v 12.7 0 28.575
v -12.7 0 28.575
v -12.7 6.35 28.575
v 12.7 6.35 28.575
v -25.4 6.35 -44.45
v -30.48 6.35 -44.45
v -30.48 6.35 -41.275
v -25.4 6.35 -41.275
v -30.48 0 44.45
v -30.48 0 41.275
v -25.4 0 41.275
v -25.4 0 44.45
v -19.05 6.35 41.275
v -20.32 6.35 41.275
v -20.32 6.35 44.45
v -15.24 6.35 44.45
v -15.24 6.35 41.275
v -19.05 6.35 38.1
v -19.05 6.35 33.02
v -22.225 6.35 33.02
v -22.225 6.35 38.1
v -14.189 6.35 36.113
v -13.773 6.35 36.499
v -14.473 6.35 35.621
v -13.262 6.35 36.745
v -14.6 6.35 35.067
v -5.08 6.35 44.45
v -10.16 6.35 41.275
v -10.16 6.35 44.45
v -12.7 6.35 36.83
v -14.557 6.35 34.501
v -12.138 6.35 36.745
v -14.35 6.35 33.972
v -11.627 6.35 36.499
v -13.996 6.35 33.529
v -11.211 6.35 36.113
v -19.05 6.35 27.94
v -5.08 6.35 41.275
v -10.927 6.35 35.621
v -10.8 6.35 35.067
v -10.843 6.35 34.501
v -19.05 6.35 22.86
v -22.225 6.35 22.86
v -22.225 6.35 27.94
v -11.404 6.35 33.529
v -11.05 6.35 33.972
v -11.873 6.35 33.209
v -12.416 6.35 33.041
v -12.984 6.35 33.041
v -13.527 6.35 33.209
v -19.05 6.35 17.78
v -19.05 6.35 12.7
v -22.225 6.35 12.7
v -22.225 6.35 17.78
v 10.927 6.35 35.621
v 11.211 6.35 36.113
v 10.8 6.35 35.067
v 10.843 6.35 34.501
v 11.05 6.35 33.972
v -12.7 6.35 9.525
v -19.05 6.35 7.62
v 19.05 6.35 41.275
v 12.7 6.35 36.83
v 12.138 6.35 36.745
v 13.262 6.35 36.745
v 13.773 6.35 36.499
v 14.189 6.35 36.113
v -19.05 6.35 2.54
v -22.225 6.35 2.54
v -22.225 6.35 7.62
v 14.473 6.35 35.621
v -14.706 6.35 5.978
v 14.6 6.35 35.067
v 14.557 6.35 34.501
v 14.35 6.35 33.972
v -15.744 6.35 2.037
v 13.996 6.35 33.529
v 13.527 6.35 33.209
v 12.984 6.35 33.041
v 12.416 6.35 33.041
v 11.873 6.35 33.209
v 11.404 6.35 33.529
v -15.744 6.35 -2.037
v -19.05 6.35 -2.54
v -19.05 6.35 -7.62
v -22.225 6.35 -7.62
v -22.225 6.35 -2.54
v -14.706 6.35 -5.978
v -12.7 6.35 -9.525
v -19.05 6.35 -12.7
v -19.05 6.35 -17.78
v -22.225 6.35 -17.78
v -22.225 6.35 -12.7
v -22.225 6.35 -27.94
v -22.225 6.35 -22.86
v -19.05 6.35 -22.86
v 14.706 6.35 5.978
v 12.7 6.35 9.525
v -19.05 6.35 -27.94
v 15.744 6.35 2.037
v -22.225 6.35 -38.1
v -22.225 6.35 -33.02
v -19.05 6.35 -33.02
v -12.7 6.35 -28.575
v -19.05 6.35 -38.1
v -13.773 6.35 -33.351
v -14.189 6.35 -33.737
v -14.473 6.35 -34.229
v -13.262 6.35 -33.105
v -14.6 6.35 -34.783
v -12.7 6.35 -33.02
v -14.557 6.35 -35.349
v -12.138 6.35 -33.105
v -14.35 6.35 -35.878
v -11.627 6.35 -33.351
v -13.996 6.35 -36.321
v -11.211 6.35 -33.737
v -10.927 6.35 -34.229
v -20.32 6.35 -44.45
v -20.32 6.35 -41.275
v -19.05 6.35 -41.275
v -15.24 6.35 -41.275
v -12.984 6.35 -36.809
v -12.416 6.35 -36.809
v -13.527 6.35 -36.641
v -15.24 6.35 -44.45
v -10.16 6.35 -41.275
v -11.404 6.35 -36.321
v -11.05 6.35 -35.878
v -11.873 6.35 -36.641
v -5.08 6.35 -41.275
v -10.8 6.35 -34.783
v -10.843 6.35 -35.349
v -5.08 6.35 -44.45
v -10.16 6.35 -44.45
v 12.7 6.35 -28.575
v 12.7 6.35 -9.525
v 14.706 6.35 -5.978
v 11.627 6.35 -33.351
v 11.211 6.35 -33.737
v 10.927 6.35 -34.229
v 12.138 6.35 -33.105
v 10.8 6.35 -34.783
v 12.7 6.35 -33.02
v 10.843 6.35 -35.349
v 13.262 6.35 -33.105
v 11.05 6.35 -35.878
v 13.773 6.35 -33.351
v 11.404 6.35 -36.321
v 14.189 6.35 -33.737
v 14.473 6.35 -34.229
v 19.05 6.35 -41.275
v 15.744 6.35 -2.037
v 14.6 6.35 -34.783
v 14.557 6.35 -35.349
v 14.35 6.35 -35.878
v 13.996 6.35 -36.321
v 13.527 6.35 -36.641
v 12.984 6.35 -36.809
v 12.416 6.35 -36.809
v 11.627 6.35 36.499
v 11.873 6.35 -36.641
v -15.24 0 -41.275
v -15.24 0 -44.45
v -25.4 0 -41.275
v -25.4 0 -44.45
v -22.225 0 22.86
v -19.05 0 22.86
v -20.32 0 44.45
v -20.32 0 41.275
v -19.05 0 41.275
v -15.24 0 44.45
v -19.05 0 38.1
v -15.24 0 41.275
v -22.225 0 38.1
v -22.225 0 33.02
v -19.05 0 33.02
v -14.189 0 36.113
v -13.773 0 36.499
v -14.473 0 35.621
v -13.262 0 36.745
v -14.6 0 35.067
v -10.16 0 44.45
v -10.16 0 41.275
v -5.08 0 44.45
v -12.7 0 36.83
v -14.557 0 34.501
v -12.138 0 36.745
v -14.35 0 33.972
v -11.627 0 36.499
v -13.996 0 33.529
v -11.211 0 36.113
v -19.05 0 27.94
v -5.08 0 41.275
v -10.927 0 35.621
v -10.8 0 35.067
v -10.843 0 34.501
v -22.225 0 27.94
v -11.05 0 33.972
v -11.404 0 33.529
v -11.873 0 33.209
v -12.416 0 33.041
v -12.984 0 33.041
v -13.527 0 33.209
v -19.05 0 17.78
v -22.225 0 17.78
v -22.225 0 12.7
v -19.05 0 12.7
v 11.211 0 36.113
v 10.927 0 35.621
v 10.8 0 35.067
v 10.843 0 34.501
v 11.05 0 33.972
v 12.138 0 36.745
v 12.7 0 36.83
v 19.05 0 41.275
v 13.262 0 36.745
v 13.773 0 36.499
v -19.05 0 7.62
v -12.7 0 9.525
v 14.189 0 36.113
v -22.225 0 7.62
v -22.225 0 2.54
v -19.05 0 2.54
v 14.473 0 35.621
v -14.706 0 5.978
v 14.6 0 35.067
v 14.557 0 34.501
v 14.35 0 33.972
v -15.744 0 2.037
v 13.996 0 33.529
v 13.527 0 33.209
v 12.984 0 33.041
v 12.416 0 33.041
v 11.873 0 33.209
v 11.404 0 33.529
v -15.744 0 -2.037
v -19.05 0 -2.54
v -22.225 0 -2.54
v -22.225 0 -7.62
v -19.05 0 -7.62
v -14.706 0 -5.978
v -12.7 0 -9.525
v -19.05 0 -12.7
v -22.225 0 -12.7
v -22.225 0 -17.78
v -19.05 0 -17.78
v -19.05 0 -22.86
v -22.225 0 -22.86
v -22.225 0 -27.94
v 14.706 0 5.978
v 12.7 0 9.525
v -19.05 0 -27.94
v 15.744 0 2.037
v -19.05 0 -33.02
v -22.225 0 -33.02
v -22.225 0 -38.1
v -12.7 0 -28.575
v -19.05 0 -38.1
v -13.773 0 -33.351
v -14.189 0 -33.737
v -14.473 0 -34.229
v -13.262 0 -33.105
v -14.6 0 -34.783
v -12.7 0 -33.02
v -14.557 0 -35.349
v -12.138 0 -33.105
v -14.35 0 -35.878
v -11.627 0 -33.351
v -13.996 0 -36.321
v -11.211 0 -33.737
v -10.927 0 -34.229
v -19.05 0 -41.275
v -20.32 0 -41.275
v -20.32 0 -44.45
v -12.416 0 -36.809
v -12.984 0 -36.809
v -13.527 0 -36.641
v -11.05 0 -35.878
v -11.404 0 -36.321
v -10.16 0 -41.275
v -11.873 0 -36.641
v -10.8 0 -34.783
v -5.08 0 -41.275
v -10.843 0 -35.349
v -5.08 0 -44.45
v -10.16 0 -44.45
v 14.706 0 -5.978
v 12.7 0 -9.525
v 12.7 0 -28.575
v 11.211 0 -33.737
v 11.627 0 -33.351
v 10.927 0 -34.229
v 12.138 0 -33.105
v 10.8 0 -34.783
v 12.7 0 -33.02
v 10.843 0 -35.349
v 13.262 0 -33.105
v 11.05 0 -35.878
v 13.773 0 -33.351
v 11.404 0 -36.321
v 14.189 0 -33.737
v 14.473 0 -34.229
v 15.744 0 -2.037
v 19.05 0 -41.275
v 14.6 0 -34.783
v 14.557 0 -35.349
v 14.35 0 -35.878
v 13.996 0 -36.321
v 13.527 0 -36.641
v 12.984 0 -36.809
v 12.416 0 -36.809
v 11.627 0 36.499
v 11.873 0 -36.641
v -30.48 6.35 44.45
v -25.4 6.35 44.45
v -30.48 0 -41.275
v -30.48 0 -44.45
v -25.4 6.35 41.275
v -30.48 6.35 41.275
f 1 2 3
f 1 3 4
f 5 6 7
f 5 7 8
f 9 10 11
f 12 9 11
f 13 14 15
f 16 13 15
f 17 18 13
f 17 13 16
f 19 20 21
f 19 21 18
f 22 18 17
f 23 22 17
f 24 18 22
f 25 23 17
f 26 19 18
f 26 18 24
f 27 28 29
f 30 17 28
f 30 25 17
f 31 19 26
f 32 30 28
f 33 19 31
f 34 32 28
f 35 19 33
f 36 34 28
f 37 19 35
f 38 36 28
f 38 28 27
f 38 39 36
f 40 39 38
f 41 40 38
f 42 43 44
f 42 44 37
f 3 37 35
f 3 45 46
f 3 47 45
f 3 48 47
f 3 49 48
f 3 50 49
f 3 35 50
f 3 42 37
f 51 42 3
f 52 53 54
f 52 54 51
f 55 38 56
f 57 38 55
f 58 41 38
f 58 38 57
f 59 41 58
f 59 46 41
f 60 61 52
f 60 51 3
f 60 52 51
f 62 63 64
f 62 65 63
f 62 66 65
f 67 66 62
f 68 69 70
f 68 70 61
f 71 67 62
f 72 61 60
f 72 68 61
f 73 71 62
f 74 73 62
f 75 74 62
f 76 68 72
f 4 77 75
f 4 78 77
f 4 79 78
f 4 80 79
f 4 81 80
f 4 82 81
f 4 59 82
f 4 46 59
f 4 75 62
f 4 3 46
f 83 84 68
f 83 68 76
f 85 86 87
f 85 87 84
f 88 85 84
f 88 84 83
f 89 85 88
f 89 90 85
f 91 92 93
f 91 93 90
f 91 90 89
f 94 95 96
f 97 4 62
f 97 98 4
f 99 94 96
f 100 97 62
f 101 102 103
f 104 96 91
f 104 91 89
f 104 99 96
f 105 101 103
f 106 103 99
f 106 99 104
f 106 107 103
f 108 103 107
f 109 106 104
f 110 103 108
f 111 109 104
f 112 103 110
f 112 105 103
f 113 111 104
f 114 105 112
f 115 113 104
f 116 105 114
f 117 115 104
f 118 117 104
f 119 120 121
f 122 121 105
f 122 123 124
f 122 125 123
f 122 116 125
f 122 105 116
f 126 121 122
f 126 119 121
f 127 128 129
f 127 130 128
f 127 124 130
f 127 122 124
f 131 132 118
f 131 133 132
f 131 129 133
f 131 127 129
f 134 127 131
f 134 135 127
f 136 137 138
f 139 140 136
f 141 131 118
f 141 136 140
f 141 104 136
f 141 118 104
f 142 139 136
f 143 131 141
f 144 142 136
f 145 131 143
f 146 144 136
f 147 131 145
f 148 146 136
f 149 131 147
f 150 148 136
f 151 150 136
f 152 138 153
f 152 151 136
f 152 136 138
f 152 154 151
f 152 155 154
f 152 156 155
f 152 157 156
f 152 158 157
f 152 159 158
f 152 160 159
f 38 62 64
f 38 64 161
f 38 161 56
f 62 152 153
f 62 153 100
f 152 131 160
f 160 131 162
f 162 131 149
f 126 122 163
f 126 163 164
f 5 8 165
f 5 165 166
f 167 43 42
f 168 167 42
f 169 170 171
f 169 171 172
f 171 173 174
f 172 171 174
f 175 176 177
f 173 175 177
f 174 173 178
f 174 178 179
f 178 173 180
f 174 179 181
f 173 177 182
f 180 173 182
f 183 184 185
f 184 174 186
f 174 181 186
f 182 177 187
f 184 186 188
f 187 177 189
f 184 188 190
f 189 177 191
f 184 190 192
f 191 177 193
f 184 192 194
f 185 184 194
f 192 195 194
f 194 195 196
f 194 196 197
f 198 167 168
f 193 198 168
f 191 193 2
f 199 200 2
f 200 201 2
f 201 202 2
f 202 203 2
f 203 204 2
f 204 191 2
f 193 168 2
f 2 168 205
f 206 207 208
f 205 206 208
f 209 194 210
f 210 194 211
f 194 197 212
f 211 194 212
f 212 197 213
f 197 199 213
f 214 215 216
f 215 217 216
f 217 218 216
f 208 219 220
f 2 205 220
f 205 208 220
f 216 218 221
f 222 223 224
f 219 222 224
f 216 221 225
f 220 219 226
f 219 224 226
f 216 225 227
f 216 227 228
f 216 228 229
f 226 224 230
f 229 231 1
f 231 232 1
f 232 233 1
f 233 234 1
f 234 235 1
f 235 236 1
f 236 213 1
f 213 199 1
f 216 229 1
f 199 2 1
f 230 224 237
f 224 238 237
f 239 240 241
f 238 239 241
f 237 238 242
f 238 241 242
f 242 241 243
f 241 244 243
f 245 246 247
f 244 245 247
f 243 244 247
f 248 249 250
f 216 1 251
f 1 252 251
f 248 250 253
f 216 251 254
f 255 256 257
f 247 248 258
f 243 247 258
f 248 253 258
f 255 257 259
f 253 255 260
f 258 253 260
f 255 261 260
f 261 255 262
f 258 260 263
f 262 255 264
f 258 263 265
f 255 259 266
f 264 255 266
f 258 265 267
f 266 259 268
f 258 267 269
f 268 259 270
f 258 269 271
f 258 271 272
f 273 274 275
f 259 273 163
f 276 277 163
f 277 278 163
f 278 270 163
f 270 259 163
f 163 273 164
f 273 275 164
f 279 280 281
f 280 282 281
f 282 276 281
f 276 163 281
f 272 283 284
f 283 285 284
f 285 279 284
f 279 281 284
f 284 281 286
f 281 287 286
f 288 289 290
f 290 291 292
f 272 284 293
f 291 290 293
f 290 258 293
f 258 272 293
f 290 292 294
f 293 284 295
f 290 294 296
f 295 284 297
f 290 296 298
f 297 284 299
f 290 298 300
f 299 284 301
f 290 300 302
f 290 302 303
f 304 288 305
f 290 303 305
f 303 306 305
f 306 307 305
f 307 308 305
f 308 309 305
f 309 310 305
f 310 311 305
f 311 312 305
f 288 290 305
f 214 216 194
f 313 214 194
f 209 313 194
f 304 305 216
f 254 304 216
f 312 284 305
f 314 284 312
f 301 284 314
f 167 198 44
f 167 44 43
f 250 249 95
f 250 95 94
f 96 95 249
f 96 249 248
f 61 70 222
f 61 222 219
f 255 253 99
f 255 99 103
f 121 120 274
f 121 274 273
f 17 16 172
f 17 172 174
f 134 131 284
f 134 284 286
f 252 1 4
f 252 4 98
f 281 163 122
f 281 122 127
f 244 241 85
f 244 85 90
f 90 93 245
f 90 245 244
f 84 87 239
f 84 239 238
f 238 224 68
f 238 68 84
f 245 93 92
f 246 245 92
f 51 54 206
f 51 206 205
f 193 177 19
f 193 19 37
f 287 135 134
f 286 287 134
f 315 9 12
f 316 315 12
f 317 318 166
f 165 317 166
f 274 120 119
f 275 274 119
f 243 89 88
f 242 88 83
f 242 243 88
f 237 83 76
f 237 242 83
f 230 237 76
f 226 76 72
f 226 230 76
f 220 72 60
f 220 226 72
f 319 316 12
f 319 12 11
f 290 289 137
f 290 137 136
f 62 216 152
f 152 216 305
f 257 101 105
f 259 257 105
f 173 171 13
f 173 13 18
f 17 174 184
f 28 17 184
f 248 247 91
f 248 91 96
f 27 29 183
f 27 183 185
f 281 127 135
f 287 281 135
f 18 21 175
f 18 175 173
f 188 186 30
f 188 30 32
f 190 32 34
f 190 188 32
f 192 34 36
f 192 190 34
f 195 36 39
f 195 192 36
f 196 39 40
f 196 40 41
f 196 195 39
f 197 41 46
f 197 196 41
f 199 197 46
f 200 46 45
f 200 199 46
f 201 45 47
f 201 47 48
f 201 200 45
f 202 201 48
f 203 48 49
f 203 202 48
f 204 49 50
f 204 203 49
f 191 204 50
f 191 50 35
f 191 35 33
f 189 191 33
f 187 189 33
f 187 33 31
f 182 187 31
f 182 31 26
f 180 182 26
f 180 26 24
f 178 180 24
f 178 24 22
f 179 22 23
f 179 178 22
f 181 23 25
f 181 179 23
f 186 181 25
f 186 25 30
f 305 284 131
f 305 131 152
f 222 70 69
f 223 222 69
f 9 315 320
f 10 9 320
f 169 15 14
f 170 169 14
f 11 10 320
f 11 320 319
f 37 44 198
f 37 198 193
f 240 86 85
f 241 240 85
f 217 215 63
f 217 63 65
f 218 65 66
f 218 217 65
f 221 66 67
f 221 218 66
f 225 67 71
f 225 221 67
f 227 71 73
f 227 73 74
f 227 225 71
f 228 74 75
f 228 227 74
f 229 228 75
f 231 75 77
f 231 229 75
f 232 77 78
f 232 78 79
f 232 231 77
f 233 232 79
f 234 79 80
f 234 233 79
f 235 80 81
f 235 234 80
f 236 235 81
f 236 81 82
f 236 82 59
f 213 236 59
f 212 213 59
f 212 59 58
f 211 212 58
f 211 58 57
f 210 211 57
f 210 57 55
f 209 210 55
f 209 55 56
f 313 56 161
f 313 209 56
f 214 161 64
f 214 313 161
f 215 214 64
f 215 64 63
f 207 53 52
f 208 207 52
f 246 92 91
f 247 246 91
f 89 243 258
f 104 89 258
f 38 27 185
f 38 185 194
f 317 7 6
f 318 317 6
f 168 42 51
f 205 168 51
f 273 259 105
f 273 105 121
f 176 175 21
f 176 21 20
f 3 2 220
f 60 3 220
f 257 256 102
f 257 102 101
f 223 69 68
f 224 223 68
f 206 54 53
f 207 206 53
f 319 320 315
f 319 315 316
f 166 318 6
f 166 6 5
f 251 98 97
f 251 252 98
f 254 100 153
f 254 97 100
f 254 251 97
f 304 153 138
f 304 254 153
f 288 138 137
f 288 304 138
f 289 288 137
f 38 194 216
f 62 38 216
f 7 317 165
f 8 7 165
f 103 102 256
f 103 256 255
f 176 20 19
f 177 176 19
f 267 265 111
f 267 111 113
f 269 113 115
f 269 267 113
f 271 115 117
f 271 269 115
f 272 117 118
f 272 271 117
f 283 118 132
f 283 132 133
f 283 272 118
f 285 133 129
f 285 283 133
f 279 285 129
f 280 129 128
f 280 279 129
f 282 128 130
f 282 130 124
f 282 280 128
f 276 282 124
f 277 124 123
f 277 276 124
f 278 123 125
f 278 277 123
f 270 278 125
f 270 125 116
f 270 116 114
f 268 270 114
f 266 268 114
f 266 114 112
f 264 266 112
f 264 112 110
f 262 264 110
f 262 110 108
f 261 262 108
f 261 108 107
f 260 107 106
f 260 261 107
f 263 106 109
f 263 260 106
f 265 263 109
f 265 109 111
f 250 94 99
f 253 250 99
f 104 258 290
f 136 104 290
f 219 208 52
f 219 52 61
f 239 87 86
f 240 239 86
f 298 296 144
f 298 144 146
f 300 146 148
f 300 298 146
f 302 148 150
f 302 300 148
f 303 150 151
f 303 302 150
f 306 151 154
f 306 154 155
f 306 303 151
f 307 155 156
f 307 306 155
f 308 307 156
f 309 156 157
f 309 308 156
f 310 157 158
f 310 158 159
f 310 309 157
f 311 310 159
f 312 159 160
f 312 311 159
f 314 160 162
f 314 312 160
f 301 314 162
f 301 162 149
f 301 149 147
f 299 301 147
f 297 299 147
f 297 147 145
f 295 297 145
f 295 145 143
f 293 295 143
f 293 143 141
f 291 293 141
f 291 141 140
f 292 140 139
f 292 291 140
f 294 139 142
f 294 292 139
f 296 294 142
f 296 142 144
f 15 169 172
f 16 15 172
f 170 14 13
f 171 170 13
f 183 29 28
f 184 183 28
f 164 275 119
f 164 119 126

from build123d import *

# Parameters (mm, degrees)
SKETCH1_W           = 38.1
SKETCH1_H           = 82.55
SKETCH1_R           = 1.905
SKETCH1_W_2         = 25.4
SKETCH1_H_2         = 57.15
BOSS_EXTRUDE1_DEPTH = 6.35
SKETCH2_R           = 15.875
CUT_EXTRUDE1_DEPTH  = 46.900442536
SKETCH3_W           = 3.175
SKETCH3_H           = 5.08
SKETCH3_W_2         = 5.08
SKETCH3_H_2         = 3.175
BOSS_EXTRUDE2_DEPTH = 6.35


with BuildPart() as part:
    # Sketch1 → Boss-Extrude1 (new body)
    with BuildSketch(Plane(origin=(0, 0, 0), x_dir=(1, 0, 0), z_dir=(0, 1, 0))):
        Rectangle(SKETCH1_W, SKETCH1_H)
        with Locations(Location((-12.7, 34.925, 0), (0, 0, 270))):
            Circle(SKETCH1_R, mode=Mode.SUBTRACT)
        with Locations(Location((12.7, 34.925, 0), (0, 0, 270))):
            Circle(SKETCH1_R, mode=Mode.SUBTRACT)
        with Locations(Location((12.7, -34.925, 0), (0, 0, 270))):
            Circle(SKETCH1_R, mode=Mode.SUBTRACT)
        with Locations(Location((-12.7, -34.925, 0), (0, 0, 270))):
            Circle(SKETCH1_R, mode=Mode.SUBTRACT)
        Rectangle(SKETCH1_W_2, SKETCH1_H_2, mode=Mode.SUBTRACT)
    extrude(amount=BOSS_EXTRUDE1_DEPTH)

    # Sketch2 → Cut-Extrude1 (cut, through all)
    with BuildSketch(Plane(origin=(0, 0, 0), x_dir=(1, 0, 0), z_dir=(0, 1, 0))):
        Circle(SKETCH2_R)
    extrude(amount=CUT_EXTRUDE1_DEPTH, mode=Mode.SUBTRACT)

    # Sketch3 → Boss-Extrude2 (add)
    with BuildSketch(Plane(origin=(0, 6.35, 0), x_dir=(1, 0, 0), z_dir=(0, 1, 0))):
        with Locations((-20.6375, 35.56)):
            Rectangle(SKETCH3_W, SKETCH3_H)
        with Locations((-20.6375, 25.4)):
            Rectangle(SKETCH3_W, SKETCH3_H)
        with Locations((-20.6375, 15.24)):
            Rectangle(SKETCH3_W, SKETCH3_H)
        with Locations((-20.6375, 5.08)):
            Rectangle(SKETCH3_W, SKETCH3_H)
        with Locations((-20.6375, -5.08)):
            Rectangle(SKETCH3_W, SKETCH3_H)
        with Locations((-20.6375, -15.24)):
            Rectangle(SKETCH3_W, SKETCH3_H)
        with Locations((-20.6375, -25.4)):
            Rectangle(SKETCH3_W, SKETCH3_H)
        with Locations((-20.6375, -35.56)):
            Rectangle(SKETCH3_W, SKETCH3_H)
        with Locations((-7.62, 42.8625)):
            Rectangle(SKETCH3_W_2, SKETCH3_H_2)
        with Locations((-17.78, 42.8625)):
            Rectangle(SKETCH3_W_2, SKETCH3_H_2)
        with Locations((-27.94, 42.8625)):
            Rectangle(SKETCH3_W_2, SKETCH3_H_2)
        with Locations((-27.94, -42.8625)):
            Rectangle(SKETCH3_W_2, SKETCH3_H_2)
        with Locations((-17.78, -42.8625)):
            Rectangle(SKETCH3_W_2, SKETCH3_H_2)
        with Locations((-7.62, -42.8625)):
            Rectangle(SKETCH3_W_2, SKETCH3_H_2)
    extrude(amount=-BOSS_EXTRUDE2_DEPTH)


with BuildPart() as boss_extrude2_piece_1:
    # of the separate pieces the step leaves, piece 1, a body of its own (boss_extrude2_pieces)
    add(part.part.solids().sort_by_distance((-15.24, 0, 41.275))[0])


with BuildPart() as boss_extrude2_piece_2:
    # of the separate pieces the step leaves, piece 2, a body of its own (boss_extrude2_pieces)
    add(part.part.solids().sort_by_distance((-25.4, 6.35, -41.275))[0])


with BuildPart() as boss_extrude2_piece_3:
    # of the separate pieces the step leaves, piece 3, a body of its own (boss_extrude2_pieces)
    add(part.part.solids().sort_by_distance((-25.4, 6.35, 41.275))[0])


solid = Compound([boss_extrude2_piece_1.part, boss_extrude2_piece_2.part, boss_extrude2_piece_3.part])
